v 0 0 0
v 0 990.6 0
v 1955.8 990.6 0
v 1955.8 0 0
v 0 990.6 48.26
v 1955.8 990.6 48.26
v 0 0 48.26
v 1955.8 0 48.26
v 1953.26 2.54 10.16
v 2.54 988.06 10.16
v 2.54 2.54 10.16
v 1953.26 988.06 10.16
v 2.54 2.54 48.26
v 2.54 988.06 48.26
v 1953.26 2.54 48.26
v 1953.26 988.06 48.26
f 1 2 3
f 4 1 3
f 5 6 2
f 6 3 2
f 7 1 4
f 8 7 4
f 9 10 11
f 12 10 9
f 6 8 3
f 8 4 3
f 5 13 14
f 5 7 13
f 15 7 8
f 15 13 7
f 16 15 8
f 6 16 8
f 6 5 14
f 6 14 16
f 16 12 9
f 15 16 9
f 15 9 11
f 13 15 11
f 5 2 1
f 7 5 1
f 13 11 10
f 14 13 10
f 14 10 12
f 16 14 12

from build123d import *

# Parameters (mm, degrees)
F0_W     = 1955.8
F0_H     = 990.6
F1_DEPTH = 10.16
F3_DEPTH = 38.1


with BuildPart() as f1:
    # F0 (on Top) → F1 (new body)
    with BuildSketch(Plane.XY):
        with Locations((977.9, 495.3)):
            Rectangle(F0_W, F0_H)
    extrude(amount=F1_DEPTH)

    # F2 (on face) → F3 (join)
    with BuildSketch(Plane.XY.offset(10.16)):
        Polygon((2.54, 125.157505), (0, 125.157505), (0, 0), (9.51278, 0), (9.51278, 2.54), (2.54, 2.54), align=None)
        Polygon((0, 990.6), (0, 125.157505), (2.54, 125.157505), (2.54, 988.06), (1948.808074, 988.06), (1948.808074, 990.6), align=None)
        Polygon((1955.8, 990.6), (1948.808074, 990.6), (1948.808074, 988.06), (1953.26, 988.06), (1953.26, 977.438092), (1955.8, 977.438092), align=None)
        Polygon((9.51278, 2.54), (9.51278, 0), (1955.8, 0), (1955.8, 977.438092), (1953.26, 977.438092), (1953.26, 2.54), align=None)
    extrude(amount=F3_DEPTH)


solid = f1.part
